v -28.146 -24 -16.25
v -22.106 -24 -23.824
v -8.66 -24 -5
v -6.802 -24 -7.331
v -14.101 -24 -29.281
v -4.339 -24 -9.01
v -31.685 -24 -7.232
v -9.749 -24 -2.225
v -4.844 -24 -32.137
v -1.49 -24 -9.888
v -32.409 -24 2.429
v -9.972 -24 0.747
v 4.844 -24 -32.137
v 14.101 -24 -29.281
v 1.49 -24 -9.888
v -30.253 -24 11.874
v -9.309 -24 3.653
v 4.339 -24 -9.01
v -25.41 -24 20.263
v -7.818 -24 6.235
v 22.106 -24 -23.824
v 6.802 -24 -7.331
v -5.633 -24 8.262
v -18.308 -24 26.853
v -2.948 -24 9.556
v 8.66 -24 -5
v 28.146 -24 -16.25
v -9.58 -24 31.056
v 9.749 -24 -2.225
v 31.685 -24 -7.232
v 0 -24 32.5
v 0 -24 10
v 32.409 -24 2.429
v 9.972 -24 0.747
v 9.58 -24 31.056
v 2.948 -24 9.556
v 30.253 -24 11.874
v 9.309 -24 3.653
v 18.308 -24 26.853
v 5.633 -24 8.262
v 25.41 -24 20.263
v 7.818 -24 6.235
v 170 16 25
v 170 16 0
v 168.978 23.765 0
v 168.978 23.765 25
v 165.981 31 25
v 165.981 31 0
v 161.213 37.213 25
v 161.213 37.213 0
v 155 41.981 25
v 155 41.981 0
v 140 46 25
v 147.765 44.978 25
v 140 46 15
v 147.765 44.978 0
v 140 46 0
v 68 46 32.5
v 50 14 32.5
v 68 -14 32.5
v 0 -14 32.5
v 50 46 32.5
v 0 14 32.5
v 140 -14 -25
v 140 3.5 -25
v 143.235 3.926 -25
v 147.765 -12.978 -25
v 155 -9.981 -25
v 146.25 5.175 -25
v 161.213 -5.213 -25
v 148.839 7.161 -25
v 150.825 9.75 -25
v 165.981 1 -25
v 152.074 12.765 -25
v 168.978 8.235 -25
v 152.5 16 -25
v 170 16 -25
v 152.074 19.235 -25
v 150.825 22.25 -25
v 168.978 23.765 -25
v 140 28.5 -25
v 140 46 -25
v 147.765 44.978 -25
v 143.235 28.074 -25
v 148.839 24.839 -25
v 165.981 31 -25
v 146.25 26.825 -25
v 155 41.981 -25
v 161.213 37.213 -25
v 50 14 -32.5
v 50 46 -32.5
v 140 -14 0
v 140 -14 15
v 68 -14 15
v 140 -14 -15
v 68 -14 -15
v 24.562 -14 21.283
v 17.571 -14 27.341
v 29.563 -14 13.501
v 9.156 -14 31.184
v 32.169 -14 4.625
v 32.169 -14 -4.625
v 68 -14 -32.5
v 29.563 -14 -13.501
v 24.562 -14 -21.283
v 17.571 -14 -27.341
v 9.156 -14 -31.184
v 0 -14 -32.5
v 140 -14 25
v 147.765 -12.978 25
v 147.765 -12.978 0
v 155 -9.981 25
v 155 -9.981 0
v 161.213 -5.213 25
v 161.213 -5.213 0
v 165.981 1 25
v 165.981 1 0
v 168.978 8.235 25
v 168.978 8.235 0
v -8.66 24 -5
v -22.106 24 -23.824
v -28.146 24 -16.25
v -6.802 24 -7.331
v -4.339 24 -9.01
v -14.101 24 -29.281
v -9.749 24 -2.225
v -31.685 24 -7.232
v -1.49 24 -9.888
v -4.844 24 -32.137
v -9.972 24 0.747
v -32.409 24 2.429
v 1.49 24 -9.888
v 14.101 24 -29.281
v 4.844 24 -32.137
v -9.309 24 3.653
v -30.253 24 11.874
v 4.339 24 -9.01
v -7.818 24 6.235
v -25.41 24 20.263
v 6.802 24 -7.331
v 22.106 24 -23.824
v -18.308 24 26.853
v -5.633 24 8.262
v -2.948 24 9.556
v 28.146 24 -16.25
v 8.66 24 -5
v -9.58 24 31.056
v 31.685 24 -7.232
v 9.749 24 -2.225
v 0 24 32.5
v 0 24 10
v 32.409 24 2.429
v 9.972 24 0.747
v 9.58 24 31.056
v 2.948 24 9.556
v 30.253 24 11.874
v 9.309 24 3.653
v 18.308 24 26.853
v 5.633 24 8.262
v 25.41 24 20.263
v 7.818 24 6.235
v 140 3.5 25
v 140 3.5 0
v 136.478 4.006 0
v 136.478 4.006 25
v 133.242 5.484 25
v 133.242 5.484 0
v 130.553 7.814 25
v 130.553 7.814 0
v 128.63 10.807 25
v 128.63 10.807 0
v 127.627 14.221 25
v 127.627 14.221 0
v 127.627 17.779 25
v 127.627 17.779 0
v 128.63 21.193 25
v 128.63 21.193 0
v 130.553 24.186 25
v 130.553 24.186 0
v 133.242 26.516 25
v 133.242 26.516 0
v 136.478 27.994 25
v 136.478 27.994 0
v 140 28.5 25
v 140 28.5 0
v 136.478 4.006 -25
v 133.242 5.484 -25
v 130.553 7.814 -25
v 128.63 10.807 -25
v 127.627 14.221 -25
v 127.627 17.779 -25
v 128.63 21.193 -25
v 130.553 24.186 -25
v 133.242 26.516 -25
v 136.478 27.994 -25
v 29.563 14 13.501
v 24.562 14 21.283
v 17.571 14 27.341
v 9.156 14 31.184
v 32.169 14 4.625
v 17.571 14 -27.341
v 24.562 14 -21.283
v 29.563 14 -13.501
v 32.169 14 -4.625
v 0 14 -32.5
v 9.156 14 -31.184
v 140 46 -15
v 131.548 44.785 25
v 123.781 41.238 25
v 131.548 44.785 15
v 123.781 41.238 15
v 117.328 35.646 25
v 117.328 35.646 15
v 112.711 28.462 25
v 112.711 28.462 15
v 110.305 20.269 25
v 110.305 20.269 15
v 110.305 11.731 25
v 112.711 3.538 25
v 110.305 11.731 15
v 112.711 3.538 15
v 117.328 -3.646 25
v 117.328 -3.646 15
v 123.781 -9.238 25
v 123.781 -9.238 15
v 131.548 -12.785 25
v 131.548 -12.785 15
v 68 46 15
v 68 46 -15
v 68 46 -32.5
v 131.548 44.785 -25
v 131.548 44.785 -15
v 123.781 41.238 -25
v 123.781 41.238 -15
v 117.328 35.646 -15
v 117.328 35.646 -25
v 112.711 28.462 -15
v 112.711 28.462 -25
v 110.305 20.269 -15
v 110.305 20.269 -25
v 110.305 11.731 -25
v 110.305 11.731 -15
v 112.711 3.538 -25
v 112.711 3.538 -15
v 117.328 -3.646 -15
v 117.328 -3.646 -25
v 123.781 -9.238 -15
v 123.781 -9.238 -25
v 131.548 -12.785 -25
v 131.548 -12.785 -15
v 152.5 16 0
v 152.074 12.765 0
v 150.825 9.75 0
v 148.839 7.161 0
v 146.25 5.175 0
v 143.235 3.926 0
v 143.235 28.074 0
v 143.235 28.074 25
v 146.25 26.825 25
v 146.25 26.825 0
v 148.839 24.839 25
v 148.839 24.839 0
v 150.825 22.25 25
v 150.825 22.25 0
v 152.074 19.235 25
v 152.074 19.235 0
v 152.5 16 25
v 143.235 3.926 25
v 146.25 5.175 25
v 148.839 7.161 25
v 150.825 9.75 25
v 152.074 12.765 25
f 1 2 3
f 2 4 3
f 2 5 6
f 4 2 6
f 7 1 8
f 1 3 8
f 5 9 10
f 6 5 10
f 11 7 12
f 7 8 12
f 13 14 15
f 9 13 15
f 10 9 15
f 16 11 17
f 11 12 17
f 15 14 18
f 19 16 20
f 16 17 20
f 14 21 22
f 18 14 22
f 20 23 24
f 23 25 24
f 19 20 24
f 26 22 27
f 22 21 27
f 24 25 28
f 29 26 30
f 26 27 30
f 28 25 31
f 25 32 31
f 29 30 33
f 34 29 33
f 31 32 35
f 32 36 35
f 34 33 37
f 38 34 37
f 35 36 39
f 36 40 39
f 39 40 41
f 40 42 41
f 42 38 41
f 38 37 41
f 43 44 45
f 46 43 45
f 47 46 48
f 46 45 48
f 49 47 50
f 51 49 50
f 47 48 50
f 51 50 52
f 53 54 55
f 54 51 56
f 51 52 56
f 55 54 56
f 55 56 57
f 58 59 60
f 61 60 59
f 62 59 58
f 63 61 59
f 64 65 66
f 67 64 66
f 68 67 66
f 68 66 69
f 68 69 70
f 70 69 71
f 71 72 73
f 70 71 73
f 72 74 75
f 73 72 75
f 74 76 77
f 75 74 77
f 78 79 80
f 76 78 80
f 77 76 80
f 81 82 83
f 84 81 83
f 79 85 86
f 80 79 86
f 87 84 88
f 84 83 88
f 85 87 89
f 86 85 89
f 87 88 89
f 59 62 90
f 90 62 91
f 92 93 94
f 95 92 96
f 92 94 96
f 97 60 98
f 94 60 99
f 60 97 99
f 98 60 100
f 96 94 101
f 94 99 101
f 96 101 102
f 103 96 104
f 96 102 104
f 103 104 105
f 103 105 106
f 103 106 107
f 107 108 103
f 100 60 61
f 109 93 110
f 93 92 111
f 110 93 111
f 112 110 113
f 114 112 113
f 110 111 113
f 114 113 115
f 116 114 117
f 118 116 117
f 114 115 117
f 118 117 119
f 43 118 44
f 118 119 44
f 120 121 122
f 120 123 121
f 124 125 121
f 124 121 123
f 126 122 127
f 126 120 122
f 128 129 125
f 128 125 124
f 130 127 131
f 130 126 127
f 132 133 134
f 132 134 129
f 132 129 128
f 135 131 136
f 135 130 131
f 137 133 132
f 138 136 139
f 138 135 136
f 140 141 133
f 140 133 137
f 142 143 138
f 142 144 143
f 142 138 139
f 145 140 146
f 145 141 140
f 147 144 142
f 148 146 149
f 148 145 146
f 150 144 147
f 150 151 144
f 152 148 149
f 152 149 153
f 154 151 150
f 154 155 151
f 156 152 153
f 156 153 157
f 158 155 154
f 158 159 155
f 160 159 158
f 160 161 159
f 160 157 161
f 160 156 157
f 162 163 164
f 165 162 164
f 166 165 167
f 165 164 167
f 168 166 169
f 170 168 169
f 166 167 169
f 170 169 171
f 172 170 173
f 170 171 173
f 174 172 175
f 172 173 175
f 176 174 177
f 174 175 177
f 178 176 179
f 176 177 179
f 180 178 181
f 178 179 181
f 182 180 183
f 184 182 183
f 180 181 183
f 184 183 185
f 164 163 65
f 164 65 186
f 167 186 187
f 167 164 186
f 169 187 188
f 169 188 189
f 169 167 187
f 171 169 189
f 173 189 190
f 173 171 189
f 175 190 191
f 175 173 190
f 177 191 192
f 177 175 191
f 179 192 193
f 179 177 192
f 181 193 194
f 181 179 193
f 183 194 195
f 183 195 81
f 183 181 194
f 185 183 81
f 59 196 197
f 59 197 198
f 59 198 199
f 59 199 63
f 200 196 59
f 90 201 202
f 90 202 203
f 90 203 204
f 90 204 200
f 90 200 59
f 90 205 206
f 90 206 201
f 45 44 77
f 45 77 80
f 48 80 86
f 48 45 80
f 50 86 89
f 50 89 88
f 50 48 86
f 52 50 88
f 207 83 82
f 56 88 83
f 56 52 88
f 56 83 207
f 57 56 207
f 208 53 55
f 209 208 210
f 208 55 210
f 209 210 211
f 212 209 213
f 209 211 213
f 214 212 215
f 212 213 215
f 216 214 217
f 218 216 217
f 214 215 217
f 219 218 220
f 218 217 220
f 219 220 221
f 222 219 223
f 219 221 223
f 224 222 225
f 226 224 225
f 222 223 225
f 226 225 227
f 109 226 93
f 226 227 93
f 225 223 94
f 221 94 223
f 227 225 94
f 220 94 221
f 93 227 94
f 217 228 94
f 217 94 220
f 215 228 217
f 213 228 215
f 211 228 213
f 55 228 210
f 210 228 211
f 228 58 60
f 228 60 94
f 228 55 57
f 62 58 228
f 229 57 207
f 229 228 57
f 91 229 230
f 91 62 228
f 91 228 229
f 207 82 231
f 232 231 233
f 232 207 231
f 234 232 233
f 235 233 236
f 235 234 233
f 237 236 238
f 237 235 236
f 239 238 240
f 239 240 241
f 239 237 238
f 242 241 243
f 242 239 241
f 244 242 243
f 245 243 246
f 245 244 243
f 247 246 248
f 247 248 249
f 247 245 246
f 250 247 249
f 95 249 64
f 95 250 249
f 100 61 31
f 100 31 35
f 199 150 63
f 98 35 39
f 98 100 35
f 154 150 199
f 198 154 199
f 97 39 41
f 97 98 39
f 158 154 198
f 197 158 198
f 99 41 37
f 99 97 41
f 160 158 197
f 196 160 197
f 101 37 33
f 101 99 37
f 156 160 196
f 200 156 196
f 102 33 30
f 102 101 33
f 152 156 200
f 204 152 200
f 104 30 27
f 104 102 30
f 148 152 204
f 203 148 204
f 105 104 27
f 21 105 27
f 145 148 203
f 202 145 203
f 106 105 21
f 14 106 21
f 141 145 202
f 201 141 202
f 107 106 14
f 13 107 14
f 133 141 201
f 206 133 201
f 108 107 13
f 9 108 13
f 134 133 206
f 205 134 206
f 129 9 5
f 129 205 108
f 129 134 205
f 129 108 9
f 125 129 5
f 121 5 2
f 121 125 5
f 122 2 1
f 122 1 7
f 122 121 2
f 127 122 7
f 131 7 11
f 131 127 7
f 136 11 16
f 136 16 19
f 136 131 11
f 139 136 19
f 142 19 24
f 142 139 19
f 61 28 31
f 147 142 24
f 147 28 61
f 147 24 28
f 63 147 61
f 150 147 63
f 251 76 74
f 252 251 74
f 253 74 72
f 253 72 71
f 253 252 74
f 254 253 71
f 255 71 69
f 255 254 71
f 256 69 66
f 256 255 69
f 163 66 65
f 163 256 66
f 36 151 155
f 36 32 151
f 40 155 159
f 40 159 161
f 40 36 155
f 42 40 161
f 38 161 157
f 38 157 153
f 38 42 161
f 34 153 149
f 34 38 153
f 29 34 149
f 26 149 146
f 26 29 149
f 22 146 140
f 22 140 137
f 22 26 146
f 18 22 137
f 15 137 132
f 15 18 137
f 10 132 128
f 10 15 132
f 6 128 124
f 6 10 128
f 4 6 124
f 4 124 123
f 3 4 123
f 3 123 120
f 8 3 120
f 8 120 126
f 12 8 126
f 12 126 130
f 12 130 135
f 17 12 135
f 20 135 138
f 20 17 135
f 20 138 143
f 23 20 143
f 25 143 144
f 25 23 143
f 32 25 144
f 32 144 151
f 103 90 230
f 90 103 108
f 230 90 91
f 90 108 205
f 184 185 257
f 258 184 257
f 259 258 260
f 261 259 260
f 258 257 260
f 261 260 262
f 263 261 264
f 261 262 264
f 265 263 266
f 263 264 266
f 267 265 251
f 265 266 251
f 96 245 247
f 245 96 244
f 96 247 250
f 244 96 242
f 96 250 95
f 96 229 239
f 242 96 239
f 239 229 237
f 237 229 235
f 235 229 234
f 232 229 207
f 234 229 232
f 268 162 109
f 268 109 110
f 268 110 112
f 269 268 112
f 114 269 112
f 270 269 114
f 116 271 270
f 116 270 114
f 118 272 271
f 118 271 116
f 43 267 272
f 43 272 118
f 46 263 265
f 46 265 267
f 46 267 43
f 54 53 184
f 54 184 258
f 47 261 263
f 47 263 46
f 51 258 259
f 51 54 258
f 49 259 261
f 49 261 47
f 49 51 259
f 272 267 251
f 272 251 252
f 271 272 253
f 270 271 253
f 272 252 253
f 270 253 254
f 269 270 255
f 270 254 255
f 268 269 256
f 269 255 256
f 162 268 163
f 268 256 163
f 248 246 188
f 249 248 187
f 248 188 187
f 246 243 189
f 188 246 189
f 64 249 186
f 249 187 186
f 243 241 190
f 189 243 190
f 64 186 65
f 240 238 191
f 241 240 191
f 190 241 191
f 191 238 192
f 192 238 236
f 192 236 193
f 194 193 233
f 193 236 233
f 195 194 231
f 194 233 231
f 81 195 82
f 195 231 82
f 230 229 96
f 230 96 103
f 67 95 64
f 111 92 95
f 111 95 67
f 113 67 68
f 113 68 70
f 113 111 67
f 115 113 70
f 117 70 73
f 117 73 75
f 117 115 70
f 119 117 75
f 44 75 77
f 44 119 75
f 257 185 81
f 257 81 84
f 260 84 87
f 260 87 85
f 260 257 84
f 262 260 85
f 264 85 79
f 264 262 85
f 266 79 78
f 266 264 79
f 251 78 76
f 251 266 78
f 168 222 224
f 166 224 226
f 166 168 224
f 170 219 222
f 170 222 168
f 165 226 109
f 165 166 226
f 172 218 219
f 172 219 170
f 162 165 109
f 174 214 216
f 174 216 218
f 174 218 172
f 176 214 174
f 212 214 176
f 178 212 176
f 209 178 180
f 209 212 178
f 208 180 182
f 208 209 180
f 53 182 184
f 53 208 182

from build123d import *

# Parameters (mm, degrees)
SKETCH1_R           = 10
BOSS_EXTRUDE1_DEPTH = 24
BOSS_EXTRUDE2_DEPTH = 14
SKETCH2_W           = 65
SKETCH2_H           = 60
BOSS_EXTRUDE3_DEPTH = 18
BOSS_EXTRUDE4_DEPTH = 15
SKETCH4_3_R         = 30
SKETCH4_3_R_2       = 12.500000000000002
BOSS_EXTRUDE5_DEPTH = 25


with BuildPart() as part:
    # Sketch1 → Boss-Extrude1 (new, symmetric)
    with BuildSketch(Plane(origin=(0, 0, 0), x_dir=(1, 0, 0), z_dir=(0, 1, 0))):
        with BuildLine():
            ThreePointArc((1.99e-15, 32.5), (-32.5, 3.98e-15), (-5.97e-15, -32.5))
            ThreePointArc((-5.97e-15, -32.5), (22.98097038856279, -22.9809703885628), (32.5, -7.96e-15))
            ThreePointArc((32.5, 0), (22.980970388562795, 22.980970388562792), (1.99e-15, 32.5))
        make_face()
        Circle(SKETCH1_R, mode=Mode.SUBTRACT)
    extrude(amount=BOSS_EXTRUDE1_DEPTH, both=True)

    # Sketch1<3> → Boss-Extrude2 (add, symmetric)
    with BuildSketch(Plane(origin=(0, 0, 0), x_dir=(1, 0, 0), z_dir=(0, 1, 0))):
        with BuildLine():
            ThreePointArc((32.5, -7.96e-15), (22.98097038856279, -22.9809703885628), (-5.97e-15, -32.5))
            Line((0, -32.5), (50, -32.5))
            Line((50, -32.5), (50, 32.5))
            Line((50, 32.5), (0, 32.5))
            ThreePointArc((1.99e-15, 32.5), (22.980970388562795, 22.980970388562792), (32.5, 0))
        make_face()
    extrude(amount=BOSS_EXTRUDE2_DEPTH, both=True)

    # Sketch2 → Boss-Extrude3 (add)
    with BuildSketch(Plane(origin=(50, 0, 0), x_dir=(0, 0, -1), z_dir=(1, 0, 0))):
        with Locations((0, 16)):
            Rectangle(SKETCH2_W, SKETCH2_H)
    extrude(amount=BOSS_EXTRUDE3_DEPTH)

    # Sketch4 → Boss-Extrude4 (add, symmetric)
    with BuildSketch(Plane.XY):
        with BuildLine():
            Line((140, 46), (68, 46))
            Line((68, 46), (68, -14))
            Line((68, -14), (140, -14))
            ThreePointArc((140, -13.999999999999996), (110, 16.000000000000004), (140, 46))
        make_face()
    extrude(amount=BOSS_EXTRUDE4_DEPTH, both=True)

    # Sketch4<3> → Boss-Extrude5 (add, symmetric)
    with BuildSketch(Plane.XY):
        with Locations((140, 16)):
            Circle(SKETCH4_3_R)
        with Locations((140, 16)):
            Circle(SKETCH4_3_R_2, mode=Mode.SUBTRACT)
    extrude(amount=BOSS_EXTRUDE5_DEPTH, both=True)


solid = part.part
